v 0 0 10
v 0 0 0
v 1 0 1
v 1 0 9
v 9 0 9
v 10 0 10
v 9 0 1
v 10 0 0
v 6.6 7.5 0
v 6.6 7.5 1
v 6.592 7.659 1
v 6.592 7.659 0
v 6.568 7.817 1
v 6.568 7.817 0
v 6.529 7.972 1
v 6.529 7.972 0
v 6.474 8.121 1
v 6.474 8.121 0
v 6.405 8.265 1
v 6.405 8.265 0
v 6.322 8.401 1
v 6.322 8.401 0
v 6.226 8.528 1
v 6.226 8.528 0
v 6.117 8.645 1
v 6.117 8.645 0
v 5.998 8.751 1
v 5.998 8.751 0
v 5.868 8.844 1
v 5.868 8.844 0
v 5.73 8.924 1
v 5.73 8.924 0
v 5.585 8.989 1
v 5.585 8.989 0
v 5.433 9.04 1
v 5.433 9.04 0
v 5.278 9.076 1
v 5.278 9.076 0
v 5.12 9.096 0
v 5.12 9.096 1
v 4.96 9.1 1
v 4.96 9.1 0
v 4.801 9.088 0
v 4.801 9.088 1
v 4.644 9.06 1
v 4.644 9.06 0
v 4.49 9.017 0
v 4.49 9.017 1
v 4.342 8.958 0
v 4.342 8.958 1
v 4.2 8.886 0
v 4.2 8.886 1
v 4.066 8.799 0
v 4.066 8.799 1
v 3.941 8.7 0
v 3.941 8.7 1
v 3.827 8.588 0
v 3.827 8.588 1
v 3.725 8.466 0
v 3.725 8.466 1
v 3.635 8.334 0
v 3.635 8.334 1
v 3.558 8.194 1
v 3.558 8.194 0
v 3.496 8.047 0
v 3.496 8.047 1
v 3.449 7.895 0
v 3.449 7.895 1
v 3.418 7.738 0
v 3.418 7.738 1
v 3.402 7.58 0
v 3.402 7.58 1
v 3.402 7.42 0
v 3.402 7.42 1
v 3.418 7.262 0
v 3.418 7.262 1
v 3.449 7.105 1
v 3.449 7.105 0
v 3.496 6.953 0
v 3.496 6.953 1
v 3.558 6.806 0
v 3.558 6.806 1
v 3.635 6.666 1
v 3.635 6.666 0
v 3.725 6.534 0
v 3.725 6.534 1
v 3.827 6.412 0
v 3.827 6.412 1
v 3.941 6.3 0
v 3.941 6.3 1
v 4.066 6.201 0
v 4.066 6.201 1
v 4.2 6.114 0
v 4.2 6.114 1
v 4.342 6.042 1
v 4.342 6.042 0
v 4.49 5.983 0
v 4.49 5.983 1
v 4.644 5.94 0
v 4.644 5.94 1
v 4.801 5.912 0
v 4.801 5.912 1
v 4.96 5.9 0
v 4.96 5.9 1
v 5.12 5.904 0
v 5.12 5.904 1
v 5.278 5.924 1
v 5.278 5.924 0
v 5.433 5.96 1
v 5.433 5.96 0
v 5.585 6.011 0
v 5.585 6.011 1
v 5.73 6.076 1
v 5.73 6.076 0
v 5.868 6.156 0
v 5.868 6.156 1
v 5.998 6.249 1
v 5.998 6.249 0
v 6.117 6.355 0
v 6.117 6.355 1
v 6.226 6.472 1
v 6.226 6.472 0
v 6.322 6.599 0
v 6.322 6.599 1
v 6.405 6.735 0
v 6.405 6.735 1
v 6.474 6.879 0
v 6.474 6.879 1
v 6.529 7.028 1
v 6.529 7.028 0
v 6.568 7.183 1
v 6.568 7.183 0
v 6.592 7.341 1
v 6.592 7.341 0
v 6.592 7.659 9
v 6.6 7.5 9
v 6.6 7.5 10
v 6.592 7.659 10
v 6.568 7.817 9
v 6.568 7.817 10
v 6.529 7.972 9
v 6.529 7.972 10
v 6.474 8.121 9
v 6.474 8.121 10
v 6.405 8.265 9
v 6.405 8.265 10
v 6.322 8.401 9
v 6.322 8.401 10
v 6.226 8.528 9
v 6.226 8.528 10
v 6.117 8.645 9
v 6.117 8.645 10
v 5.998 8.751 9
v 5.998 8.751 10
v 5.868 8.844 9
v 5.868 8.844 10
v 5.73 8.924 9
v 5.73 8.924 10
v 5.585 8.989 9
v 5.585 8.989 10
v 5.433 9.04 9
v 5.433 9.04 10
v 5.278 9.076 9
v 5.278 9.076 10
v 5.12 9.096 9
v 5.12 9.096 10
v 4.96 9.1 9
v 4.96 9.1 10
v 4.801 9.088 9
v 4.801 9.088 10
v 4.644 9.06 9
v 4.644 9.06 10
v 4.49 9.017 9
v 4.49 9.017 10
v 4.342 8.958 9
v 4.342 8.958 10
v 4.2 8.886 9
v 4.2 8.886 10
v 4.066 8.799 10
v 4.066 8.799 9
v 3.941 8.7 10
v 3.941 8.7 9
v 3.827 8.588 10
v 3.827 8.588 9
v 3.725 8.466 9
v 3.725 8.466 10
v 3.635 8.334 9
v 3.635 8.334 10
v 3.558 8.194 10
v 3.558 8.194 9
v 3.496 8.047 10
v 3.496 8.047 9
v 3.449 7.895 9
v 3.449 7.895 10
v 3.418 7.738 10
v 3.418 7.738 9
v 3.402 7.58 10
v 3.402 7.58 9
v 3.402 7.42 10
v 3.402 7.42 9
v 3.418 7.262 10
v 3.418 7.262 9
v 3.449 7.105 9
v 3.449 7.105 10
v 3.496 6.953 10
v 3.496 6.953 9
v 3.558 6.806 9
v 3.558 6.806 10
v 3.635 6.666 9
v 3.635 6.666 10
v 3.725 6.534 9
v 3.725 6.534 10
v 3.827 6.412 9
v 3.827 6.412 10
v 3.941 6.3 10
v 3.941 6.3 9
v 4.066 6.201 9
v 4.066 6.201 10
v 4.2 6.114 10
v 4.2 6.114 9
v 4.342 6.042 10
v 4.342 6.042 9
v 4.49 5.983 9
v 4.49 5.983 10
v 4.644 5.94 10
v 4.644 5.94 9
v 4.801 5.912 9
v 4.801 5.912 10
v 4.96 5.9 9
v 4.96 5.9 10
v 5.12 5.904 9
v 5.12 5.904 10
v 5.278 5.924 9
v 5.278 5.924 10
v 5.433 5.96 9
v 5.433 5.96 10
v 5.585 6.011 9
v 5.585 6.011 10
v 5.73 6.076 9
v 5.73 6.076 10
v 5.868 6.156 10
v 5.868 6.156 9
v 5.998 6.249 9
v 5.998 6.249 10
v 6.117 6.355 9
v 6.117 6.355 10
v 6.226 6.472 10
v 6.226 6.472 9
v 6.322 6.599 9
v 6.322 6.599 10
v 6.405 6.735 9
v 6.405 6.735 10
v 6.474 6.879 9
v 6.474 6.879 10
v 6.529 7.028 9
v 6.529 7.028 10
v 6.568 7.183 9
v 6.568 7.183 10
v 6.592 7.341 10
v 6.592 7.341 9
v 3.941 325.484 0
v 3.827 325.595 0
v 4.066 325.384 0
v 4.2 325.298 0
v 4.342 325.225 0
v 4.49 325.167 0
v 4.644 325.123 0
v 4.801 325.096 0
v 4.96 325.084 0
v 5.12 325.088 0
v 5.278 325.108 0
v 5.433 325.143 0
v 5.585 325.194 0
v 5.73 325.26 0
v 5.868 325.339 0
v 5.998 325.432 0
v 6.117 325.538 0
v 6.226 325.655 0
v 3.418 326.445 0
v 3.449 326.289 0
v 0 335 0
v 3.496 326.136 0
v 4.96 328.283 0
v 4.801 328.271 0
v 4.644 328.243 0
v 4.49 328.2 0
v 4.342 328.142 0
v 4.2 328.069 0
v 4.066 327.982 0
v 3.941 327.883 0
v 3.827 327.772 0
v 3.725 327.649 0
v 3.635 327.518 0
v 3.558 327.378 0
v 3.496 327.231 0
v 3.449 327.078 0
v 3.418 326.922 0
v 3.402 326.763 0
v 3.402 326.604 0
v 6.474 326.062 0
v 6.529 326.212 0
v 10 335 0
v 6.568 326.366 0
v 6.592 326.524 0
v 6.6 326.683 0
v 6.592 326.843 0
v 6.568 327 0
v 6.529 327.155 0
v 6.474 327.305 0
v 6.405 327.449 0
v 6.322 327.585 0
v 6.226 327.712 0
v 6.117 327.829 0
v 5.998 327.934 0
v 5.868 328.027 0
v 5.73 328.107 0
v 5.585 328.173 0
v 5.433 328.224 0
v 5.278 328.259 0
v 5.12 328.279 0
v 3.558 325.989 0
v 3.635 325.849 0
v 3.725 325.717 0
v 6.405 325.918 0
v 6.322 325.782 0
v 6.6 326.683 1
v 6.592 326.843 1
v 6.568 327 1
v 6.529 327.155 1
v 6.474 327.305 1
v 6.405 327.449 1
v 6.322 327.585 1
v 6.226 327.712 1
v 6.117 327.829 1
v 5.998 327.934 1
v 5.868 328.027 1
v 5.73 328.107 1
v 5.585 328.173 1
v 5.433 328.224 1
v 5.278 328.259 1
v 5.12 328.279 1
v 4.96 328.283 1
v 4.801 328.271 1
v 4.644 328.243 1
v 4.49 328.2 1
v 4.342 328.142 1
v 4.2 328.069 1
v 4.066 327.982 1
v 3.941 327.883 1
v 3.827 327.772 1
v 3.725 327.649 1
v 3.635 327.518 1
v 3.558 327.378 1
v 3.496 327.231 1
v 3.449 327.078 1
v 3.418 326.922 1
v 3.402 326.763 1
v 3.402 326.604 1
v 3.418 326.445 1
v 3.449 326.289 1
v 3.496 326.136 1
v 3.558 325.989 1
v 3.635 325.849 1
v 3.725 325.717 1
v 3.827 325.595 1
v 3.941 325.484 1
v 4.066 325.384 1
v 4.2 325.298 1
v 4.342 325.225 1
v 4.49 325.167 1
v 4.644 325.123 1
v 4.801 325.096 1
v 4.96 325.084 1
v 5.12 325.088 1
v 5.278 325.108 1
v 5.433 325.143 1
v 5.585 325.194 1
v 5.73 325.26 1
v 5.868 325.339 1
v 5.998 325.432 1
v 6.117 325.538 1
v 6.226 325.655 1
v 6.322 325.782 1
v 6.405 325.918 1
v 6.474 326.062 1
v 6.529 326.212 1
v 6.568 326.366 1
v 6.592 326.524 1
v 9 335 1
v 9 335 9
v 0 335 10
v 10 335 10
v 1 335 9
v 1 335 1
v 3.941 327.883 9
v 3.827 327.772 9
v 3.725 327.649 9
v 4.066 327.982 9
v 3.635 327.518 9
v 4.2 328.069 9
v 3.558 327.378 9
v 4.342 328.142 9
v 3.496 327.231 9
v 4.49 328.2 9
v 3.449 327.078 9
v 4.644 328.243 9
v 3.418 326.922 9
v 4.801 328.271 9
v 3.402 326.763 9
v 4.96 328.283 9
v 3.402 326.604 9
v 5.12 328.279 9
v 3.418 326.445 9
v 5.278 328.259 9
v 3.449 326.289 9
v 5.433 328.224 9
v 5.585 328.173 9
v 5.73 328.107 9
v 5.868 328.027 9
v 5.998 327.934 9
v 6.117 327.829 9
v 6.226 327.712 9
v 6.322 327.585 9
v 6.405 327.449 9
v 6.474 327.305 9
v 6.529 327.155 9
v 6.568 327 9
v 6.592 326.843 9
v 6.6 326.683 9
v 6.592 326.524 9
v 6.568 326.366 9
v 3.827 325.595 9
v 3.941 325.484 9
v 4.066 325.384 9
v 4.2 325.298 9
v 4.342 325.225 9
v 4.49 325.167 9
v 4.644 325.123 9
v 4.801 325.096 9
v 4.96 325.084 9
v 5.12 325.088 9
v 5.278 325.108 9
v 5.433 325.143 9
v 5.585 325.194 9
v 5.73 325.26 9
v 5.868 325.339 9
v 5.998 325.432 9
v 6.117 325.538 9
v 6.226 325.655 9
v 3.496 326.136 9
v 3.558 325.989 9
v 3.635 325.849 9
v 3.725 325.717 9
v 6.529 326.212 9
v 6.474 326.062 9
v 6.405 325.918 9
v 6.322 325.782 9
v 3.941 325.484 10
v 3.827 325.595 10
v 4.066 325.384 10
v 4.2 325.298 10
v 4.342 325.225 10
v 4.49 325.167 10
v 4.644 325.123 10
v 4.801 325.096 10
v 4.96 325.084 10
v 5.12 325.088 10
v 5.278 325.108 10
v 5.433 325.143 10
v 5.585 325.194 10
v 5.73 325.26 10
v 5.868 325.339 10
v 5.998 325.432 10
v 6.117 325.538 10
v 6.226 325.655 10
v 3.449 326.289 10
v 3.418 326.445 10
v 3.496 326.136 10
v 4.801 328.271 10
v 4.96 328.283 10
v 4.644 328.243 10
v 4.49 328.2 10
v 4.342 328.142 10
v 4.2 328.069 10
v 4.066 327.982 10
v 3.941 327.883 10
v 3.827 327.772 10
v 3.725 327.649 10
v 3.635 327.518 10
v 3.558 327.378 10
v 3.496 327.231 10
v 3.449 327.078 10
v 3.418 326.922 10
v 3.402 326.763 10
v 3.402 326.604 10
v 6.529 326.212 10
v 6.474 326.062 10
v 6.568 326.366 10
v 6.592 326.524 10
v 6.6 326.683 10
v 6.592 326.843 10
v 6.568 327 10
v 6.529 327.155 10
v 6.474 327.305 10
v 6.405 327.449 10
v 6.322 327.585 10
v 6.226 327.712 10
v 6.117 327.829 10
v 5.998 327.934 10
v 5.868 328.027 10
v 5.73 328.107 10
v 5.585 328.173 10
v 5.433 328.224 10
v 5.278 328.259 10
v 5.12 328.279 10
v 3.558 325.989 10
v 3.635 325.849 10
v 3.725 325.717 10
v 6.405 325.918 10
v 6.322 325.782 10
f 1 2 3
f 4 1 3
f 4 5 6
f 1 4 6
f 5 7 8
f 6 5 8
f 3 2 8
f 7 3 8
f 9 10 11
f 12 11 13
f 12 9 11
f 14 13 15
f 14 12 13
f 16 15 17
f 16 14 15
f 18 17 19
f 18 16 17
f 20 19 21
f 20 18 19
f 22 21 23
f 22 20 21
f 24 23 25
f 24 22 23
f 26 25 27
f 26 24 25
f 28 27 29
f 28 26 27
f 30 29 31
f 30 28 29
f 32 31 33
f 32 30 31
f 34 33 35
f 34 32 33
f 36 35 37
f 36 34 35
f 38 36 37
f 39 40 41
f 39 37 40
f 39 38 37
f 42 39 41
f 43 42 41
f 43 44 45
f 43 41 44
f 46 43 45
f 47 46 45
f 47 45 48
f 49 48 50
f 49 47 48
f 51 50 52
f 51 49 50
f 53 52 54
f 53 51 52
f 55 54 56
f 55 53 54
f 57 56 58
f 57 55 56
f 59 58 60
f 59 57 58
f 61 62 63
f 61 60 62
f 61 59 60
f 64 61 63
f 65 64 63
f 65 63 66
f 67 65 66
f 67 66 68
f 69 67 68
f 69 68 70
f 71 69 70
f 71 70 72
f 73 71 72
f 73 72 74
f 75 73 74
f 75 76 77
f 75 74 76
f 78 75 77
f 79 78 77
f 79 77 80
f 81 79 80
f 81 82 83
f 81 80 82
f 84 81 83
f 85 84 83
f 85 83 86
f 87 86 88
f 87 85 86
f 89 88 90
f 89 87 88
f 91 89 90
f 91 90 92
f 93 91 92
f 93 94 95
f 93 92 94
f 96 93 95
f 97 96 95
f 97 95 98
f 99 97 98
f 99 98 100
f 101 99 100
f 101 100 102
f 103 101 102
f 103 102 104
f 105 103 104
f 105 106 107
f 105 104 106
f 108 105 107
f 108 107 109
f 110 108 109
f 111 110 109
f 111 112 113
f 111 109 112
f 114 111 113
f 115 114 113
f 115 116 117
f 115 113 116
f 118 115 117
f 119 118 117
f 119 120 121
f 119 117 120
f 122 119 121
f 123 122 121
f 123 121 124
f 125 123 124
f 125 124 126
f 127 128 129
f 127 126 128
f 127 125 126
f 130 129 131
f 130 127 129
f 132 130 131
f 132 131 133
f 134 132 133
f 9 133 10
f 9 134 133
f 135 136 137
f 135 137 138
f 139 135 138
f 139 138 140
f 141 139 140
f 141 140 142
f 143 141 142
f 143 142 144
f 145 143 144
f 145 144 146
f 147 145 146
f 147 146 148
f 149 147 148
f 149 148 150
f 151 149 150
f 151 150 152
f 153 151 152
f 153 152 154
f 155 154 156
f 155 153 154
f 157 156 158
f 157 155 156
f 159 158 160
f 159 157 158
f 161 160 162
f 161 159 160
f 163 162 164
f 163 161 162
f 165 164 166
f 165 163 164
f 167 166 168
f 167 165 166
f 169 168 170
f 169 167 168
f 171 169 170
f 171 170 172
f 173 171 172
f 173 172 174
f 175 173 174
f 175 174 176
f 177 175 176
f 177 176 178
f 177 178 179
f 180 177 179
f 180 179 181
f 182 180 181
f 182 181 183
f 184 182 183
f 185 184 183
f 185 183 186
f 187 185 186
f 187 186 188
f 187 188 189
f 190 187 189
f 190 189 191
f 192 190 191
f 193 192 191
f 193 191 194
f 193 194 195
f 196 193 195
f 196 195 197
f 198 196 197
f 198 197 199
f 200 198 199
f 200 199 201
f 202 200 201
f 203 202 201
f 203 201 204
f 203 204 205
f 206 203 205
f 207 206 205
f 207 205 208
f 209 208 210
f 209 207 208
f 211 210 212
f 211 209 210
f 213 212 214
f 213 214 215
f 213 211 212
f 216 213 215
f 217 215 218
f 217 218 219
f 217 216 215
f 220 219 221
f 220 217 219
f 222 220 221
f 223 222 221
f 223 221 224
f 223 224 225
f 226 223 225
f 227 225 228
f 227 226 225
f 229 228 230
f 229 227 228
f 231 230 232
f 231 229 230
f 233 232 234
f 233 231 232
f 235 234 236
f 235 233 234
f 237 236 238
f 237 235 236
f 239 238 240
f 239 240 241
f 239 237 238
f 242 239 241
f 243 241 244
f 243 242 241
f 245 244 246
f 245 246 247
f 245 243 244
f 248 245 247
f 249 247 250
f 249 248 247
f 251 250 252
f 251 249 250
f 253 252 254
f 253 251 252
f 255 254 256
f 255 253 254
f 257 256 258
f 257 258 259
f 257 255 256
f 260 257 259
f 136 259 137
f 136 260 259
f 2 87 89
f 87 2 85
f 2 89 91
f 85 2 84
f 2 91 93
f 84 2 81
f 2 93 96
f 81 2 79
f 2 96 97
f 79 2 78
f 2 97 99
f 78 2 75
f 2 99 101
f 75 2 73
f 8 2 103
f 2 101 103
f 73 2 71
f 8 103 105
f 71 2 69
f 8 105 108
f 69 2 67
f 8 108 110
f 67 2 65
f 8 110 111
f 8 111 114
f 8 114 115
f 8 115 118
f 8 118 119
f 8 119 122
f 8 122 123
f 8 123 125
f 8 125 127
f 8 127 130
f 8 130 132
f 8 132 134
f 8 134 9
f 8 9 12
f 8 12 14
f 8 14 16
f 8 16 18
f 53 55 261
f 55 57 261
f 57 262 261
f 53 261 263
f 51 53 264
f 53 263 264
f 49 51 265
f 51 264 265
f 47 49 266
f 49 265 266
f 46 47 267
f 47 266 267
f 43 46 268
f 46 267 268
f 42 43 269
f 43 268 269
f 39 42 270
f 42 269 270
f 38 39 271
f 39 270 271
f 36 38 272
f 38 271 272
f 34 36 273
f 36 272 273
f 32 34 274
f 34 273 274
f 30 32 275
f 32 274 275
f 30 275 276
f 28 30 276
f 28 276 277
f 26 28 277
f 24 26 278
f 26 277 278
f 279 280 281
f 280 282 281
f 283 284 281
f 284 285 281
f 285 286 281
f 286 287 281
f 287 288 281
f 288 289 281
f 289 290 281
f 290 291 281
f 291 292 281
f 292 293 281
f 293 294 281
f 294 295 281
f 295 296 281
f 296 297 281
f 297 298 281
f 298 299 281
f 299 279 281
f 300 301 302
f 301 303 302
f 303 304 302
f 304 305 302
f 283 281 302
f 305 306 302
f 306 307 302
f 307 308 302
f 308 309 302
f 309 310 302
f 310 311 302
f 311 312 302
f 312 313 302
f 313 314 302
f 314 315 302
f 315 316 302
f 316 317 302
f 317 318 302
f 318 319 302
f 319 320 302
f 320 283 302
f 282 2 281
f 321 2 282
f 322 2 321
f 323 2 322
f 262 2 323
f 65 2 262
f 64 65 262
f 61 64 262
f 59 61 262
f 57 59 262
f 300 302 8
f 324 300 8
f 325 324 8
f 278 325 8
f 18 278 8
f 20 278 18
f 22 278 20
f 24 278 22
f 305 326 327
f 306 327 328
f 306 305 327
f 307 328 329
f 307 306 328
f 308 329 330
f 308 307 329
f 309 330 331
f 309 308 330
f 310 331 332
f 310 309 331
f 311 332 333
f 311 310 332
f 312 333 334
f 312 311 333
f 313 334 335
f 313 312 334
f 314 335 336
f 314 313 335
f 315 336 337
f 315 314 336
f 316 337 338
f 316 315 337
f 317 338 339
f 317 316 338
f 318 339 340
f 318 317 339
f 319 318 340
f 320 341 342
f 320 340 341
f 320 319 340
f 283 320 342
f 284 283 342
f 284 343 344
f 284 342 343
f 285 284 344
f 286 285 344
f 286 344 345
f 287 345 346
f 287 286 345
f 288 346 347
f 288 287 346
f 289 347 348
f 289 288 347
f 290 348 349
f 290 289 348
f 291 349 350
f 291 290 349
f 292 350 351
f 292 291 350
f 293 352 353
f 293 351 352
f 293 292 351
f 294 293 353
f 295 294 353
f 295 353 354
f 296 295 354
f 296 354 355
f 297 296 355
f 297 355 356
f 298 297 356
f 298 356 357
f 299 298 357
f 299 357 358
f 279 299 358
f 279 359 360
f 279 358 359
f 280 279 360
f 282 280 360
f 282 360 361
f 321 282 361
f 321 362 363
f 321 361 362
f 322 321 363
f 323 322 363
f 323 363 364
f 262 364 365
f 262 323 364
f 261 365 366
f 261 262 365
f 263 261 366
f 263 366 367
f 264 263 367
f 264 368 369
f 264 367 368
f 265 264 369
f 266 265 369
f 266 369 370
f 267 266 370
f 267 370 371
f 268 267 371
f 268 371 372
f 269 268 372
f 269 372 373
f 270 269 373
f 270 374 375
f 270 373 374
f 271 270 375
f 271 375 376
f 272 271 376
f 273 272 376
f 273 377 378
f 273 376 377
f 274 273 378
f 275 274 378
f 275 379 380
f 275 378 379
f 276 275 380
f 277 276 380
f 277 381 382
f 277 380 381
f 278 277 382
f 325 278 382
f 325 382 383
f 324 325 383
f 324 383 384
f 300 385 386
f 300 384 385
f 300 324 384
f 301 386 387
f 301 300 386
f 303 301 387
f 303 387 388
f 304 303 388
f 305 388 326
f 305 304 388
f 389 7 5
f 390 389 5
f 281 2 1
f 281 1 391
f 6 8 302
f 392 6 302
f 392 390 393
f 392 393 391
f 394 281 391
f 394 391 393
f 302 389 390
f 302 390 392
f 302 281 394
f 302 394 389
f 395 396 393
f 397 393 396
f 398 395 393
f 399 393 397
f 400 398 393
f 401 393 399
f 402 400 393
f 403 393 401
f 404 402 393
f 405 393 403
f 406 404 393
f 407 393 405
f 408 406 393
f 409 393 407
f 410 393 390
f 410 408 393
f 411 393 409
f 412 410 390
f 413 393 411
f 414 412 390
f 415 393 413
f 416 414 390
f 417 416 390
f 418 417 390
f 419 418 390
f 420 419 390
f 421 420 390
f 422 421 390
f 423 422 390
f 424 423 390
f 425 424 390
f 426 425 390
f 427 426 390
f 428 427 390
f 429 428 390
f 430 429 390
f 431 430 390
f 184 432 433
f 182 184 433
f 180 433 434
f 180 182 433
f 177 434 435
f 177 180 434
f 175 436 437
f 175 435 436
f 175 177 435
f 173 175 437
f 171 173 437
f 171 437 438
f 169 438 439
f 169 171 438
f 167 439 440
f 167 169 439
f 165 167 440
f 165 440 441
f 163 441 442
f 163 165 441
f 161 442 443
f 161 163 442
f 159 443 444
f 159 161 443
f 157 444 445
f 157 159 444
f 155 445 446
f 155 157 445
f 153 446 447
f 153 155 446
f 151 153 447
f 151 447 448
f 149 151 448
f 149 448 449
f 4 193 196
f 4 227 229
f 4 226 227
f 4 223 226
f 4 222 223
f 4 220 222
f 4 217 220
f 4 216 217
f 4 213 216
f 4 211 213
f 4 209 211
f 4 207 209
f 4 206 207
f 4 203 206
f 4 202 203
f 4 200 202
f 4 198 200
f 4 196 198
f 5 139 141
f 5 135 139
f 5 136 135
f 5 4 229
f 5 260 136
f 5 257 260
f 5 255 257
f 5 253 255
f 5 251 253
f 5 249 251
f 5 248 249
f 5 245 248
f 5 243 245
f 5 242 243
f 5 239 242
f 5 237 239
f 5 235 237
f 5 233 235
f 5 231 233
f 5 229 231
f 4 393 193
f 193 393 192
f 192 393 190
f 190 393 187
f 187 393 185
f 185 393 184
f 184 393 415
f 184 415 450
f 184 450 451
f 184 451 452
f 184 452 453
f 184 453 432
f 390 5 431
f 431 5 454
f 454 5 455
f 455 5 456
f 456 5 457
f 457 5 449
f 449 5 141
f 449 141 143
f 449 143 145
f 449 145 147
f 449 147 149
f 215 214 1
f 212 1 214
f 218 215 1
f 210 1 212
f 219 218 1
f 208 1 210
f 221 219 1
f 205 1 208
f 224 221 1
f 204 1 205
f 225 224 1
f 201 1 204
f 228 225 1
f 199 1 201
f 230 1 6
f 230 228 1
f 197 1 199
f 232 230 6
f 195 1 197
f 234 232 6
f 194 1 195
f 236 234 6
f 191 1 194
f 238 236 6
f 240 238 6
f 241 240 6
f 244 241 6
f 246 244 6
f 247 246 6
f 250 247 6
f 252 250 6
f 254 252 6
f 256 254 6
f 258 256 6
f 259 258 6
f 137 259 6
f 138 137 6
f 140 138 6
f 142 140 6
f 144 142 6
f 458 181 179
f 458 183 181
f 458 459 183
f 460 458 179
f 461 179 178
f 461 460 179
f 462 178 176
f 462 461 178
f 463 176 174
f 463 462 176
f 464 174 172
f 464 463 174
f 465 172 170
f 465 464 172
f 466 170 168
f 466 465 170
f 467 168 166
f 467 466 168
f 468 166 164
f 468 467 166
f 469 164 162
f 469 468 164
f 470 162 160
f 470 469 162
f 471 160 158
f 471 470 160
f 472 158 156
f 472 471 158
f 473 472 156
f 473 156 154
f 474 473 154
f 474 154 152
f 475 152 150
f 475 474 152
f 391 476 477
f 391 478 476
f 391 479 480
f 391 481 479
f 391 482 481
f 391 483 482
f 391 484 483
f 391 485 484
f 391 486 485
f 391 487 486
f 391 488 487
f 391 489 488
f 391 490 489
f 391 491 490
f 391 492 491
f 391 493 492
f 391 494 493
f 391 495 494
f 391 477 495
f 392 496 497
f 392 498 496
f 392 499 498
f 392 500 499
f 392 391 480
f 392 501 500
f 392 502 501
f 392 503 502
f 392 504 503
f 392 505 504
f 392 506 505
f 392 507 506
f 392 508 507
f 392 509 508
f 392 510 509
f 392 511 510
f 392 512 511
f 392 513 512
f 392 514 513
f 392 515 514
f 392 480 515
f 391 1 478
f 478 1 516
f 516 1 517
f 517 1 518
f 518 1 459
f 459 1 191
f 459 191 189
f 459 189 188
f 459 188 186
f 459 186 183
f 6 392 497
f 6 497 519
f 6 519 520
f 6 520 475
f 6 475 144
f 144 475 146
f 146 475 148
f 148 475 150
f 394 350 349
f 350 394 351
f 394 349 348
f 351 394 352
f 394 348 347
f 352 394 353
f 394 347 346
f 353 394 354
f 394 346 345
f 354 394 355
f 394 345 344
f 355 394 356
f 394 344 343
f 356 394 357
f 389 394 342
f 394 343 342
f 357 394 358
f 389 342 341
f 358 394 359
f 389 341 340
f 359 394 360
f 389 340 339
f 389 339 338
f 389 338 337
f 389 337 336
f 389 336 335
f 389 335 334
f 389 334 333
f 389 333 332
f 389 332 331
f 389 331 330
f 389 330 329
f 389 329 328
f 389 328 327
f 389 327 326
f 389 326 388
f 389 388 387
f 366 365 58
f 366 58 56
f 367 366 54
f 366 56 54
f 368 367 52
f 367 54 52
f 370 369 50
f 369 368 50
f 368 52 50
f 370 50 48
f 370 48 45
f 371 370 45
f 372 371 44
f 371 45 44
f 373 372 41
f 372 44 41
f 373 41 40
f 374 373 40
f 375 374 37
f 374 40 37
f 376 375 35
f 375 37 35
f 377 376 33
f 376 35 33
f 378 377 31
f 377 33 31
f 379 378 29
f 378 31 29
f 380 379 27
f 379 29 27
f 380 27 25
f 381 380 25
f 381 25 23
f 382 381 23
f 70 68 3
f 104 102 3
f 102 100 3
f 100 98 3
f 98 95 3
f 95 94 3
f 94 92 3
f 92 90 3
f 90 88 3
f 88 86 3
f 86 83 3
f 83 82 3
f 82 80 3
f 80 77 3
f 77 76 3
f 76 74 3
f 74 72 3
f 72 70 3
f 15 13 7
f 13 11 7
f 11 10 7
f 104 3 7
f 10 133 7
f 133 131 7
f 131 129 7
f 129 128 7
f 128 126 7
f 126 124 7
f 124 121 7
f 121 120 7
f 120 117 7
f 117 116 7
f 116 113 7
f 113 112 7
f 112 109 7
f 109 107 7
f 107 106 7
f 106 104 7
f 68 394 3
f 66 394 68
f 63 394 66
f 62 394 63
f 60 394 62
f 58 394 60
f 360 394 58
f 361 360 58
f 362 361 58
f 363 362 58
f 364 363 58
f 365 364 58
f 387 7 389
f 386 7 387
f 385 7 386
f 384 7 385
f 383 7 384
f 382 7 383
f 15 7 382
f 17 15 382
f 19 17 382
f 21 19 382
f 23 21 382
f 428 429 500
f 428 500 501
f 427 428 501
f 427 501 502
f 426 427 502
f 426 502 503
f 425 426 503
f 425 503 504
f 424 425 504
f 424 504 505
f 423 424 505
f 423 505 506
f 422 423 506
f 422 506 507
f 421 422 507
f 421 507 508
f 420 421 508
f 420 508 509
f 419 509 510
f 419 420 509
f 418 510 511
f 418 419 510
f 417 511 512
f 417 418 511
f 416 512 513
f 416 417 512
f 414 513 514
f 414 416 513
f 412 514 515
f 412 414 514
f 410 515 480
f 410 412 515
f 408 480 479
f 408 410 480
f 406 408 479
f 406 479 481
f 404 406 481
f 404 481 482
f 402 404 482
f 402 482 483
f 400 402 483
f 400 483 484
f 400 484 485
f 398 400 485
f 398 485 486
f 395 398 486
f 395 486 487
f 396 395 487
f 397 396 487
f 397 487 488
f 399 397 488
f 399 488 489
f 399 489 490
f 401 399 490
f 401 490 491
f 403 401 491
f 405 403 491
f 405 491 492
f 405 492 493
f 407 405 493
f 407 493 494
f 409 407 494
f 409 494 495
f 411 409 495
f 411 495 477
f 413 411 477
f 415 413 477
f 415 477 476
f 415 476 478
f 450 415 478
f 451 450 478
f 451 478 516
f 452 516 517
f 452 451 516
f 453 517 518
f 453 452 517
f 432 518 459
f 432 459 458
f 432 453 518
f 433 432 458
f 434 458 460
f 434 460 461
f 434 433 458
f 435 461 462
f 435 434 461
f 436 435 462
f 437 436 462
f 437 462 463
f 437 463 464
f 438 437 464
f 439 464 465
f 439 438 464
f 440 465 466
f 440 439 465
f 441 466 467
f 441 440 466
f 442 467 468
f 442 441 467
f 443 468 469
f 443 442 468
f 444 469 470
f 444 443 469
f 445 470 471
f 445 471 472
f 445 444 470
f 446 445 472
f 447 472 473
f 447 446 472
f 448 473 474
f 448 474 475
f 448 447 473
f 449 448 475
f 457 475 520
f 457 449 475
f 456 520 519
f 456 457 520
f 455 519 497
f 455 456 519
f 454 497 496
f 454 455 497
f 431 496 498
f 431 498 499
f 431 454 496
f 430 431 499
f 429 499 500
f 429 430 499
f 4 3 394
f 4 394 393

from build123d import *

# Parameters (mm, degrees)
SKETCH_1_W          = 10
SKETCH_1_H          = 335
SKETCH_1_R          = 1.6
EXTRUDE_1_DEPTH     = 10
SKETCH_2_W          = 8
SKETCH_2_H          = 8
CUT_EXTRUDE_1_DEPTH = 1000


with BuildPart() as part:
    # ｽｹｯﾁ1 → ﾎﾞｽ - 押し出し1 (new body)
    with BuildSketch(Plane.XY):
        with Locations((5, 167.5)):
            Rectangle(SKETCH_1_W, SKETCH_1_H)
        with Locations((5, 326.683332908)):
            Circle(SKETCH_1_R, mode=Mode.SUBTRACT)
        with Locations((5, 7.5)):
            Circle(SKETCH_1_R, mode=Mode.SUBTRACT)
    extrude(amount=EXTRUDE_1_DEPTH)

    # ｽｹｯﾁ2 → ｶｯﾄ - 押し出し1 (cut)
    with BuildSketch(Plane.XZ):
        with Locations((5, 5)):
            Rectangle(SKETCH_2_W, SKETCH_2_H)
    extrude(amount=-CUT_EXTRUDE_1_DEPTH, mode=Mode.SUBTRACT)


solid = part.part
